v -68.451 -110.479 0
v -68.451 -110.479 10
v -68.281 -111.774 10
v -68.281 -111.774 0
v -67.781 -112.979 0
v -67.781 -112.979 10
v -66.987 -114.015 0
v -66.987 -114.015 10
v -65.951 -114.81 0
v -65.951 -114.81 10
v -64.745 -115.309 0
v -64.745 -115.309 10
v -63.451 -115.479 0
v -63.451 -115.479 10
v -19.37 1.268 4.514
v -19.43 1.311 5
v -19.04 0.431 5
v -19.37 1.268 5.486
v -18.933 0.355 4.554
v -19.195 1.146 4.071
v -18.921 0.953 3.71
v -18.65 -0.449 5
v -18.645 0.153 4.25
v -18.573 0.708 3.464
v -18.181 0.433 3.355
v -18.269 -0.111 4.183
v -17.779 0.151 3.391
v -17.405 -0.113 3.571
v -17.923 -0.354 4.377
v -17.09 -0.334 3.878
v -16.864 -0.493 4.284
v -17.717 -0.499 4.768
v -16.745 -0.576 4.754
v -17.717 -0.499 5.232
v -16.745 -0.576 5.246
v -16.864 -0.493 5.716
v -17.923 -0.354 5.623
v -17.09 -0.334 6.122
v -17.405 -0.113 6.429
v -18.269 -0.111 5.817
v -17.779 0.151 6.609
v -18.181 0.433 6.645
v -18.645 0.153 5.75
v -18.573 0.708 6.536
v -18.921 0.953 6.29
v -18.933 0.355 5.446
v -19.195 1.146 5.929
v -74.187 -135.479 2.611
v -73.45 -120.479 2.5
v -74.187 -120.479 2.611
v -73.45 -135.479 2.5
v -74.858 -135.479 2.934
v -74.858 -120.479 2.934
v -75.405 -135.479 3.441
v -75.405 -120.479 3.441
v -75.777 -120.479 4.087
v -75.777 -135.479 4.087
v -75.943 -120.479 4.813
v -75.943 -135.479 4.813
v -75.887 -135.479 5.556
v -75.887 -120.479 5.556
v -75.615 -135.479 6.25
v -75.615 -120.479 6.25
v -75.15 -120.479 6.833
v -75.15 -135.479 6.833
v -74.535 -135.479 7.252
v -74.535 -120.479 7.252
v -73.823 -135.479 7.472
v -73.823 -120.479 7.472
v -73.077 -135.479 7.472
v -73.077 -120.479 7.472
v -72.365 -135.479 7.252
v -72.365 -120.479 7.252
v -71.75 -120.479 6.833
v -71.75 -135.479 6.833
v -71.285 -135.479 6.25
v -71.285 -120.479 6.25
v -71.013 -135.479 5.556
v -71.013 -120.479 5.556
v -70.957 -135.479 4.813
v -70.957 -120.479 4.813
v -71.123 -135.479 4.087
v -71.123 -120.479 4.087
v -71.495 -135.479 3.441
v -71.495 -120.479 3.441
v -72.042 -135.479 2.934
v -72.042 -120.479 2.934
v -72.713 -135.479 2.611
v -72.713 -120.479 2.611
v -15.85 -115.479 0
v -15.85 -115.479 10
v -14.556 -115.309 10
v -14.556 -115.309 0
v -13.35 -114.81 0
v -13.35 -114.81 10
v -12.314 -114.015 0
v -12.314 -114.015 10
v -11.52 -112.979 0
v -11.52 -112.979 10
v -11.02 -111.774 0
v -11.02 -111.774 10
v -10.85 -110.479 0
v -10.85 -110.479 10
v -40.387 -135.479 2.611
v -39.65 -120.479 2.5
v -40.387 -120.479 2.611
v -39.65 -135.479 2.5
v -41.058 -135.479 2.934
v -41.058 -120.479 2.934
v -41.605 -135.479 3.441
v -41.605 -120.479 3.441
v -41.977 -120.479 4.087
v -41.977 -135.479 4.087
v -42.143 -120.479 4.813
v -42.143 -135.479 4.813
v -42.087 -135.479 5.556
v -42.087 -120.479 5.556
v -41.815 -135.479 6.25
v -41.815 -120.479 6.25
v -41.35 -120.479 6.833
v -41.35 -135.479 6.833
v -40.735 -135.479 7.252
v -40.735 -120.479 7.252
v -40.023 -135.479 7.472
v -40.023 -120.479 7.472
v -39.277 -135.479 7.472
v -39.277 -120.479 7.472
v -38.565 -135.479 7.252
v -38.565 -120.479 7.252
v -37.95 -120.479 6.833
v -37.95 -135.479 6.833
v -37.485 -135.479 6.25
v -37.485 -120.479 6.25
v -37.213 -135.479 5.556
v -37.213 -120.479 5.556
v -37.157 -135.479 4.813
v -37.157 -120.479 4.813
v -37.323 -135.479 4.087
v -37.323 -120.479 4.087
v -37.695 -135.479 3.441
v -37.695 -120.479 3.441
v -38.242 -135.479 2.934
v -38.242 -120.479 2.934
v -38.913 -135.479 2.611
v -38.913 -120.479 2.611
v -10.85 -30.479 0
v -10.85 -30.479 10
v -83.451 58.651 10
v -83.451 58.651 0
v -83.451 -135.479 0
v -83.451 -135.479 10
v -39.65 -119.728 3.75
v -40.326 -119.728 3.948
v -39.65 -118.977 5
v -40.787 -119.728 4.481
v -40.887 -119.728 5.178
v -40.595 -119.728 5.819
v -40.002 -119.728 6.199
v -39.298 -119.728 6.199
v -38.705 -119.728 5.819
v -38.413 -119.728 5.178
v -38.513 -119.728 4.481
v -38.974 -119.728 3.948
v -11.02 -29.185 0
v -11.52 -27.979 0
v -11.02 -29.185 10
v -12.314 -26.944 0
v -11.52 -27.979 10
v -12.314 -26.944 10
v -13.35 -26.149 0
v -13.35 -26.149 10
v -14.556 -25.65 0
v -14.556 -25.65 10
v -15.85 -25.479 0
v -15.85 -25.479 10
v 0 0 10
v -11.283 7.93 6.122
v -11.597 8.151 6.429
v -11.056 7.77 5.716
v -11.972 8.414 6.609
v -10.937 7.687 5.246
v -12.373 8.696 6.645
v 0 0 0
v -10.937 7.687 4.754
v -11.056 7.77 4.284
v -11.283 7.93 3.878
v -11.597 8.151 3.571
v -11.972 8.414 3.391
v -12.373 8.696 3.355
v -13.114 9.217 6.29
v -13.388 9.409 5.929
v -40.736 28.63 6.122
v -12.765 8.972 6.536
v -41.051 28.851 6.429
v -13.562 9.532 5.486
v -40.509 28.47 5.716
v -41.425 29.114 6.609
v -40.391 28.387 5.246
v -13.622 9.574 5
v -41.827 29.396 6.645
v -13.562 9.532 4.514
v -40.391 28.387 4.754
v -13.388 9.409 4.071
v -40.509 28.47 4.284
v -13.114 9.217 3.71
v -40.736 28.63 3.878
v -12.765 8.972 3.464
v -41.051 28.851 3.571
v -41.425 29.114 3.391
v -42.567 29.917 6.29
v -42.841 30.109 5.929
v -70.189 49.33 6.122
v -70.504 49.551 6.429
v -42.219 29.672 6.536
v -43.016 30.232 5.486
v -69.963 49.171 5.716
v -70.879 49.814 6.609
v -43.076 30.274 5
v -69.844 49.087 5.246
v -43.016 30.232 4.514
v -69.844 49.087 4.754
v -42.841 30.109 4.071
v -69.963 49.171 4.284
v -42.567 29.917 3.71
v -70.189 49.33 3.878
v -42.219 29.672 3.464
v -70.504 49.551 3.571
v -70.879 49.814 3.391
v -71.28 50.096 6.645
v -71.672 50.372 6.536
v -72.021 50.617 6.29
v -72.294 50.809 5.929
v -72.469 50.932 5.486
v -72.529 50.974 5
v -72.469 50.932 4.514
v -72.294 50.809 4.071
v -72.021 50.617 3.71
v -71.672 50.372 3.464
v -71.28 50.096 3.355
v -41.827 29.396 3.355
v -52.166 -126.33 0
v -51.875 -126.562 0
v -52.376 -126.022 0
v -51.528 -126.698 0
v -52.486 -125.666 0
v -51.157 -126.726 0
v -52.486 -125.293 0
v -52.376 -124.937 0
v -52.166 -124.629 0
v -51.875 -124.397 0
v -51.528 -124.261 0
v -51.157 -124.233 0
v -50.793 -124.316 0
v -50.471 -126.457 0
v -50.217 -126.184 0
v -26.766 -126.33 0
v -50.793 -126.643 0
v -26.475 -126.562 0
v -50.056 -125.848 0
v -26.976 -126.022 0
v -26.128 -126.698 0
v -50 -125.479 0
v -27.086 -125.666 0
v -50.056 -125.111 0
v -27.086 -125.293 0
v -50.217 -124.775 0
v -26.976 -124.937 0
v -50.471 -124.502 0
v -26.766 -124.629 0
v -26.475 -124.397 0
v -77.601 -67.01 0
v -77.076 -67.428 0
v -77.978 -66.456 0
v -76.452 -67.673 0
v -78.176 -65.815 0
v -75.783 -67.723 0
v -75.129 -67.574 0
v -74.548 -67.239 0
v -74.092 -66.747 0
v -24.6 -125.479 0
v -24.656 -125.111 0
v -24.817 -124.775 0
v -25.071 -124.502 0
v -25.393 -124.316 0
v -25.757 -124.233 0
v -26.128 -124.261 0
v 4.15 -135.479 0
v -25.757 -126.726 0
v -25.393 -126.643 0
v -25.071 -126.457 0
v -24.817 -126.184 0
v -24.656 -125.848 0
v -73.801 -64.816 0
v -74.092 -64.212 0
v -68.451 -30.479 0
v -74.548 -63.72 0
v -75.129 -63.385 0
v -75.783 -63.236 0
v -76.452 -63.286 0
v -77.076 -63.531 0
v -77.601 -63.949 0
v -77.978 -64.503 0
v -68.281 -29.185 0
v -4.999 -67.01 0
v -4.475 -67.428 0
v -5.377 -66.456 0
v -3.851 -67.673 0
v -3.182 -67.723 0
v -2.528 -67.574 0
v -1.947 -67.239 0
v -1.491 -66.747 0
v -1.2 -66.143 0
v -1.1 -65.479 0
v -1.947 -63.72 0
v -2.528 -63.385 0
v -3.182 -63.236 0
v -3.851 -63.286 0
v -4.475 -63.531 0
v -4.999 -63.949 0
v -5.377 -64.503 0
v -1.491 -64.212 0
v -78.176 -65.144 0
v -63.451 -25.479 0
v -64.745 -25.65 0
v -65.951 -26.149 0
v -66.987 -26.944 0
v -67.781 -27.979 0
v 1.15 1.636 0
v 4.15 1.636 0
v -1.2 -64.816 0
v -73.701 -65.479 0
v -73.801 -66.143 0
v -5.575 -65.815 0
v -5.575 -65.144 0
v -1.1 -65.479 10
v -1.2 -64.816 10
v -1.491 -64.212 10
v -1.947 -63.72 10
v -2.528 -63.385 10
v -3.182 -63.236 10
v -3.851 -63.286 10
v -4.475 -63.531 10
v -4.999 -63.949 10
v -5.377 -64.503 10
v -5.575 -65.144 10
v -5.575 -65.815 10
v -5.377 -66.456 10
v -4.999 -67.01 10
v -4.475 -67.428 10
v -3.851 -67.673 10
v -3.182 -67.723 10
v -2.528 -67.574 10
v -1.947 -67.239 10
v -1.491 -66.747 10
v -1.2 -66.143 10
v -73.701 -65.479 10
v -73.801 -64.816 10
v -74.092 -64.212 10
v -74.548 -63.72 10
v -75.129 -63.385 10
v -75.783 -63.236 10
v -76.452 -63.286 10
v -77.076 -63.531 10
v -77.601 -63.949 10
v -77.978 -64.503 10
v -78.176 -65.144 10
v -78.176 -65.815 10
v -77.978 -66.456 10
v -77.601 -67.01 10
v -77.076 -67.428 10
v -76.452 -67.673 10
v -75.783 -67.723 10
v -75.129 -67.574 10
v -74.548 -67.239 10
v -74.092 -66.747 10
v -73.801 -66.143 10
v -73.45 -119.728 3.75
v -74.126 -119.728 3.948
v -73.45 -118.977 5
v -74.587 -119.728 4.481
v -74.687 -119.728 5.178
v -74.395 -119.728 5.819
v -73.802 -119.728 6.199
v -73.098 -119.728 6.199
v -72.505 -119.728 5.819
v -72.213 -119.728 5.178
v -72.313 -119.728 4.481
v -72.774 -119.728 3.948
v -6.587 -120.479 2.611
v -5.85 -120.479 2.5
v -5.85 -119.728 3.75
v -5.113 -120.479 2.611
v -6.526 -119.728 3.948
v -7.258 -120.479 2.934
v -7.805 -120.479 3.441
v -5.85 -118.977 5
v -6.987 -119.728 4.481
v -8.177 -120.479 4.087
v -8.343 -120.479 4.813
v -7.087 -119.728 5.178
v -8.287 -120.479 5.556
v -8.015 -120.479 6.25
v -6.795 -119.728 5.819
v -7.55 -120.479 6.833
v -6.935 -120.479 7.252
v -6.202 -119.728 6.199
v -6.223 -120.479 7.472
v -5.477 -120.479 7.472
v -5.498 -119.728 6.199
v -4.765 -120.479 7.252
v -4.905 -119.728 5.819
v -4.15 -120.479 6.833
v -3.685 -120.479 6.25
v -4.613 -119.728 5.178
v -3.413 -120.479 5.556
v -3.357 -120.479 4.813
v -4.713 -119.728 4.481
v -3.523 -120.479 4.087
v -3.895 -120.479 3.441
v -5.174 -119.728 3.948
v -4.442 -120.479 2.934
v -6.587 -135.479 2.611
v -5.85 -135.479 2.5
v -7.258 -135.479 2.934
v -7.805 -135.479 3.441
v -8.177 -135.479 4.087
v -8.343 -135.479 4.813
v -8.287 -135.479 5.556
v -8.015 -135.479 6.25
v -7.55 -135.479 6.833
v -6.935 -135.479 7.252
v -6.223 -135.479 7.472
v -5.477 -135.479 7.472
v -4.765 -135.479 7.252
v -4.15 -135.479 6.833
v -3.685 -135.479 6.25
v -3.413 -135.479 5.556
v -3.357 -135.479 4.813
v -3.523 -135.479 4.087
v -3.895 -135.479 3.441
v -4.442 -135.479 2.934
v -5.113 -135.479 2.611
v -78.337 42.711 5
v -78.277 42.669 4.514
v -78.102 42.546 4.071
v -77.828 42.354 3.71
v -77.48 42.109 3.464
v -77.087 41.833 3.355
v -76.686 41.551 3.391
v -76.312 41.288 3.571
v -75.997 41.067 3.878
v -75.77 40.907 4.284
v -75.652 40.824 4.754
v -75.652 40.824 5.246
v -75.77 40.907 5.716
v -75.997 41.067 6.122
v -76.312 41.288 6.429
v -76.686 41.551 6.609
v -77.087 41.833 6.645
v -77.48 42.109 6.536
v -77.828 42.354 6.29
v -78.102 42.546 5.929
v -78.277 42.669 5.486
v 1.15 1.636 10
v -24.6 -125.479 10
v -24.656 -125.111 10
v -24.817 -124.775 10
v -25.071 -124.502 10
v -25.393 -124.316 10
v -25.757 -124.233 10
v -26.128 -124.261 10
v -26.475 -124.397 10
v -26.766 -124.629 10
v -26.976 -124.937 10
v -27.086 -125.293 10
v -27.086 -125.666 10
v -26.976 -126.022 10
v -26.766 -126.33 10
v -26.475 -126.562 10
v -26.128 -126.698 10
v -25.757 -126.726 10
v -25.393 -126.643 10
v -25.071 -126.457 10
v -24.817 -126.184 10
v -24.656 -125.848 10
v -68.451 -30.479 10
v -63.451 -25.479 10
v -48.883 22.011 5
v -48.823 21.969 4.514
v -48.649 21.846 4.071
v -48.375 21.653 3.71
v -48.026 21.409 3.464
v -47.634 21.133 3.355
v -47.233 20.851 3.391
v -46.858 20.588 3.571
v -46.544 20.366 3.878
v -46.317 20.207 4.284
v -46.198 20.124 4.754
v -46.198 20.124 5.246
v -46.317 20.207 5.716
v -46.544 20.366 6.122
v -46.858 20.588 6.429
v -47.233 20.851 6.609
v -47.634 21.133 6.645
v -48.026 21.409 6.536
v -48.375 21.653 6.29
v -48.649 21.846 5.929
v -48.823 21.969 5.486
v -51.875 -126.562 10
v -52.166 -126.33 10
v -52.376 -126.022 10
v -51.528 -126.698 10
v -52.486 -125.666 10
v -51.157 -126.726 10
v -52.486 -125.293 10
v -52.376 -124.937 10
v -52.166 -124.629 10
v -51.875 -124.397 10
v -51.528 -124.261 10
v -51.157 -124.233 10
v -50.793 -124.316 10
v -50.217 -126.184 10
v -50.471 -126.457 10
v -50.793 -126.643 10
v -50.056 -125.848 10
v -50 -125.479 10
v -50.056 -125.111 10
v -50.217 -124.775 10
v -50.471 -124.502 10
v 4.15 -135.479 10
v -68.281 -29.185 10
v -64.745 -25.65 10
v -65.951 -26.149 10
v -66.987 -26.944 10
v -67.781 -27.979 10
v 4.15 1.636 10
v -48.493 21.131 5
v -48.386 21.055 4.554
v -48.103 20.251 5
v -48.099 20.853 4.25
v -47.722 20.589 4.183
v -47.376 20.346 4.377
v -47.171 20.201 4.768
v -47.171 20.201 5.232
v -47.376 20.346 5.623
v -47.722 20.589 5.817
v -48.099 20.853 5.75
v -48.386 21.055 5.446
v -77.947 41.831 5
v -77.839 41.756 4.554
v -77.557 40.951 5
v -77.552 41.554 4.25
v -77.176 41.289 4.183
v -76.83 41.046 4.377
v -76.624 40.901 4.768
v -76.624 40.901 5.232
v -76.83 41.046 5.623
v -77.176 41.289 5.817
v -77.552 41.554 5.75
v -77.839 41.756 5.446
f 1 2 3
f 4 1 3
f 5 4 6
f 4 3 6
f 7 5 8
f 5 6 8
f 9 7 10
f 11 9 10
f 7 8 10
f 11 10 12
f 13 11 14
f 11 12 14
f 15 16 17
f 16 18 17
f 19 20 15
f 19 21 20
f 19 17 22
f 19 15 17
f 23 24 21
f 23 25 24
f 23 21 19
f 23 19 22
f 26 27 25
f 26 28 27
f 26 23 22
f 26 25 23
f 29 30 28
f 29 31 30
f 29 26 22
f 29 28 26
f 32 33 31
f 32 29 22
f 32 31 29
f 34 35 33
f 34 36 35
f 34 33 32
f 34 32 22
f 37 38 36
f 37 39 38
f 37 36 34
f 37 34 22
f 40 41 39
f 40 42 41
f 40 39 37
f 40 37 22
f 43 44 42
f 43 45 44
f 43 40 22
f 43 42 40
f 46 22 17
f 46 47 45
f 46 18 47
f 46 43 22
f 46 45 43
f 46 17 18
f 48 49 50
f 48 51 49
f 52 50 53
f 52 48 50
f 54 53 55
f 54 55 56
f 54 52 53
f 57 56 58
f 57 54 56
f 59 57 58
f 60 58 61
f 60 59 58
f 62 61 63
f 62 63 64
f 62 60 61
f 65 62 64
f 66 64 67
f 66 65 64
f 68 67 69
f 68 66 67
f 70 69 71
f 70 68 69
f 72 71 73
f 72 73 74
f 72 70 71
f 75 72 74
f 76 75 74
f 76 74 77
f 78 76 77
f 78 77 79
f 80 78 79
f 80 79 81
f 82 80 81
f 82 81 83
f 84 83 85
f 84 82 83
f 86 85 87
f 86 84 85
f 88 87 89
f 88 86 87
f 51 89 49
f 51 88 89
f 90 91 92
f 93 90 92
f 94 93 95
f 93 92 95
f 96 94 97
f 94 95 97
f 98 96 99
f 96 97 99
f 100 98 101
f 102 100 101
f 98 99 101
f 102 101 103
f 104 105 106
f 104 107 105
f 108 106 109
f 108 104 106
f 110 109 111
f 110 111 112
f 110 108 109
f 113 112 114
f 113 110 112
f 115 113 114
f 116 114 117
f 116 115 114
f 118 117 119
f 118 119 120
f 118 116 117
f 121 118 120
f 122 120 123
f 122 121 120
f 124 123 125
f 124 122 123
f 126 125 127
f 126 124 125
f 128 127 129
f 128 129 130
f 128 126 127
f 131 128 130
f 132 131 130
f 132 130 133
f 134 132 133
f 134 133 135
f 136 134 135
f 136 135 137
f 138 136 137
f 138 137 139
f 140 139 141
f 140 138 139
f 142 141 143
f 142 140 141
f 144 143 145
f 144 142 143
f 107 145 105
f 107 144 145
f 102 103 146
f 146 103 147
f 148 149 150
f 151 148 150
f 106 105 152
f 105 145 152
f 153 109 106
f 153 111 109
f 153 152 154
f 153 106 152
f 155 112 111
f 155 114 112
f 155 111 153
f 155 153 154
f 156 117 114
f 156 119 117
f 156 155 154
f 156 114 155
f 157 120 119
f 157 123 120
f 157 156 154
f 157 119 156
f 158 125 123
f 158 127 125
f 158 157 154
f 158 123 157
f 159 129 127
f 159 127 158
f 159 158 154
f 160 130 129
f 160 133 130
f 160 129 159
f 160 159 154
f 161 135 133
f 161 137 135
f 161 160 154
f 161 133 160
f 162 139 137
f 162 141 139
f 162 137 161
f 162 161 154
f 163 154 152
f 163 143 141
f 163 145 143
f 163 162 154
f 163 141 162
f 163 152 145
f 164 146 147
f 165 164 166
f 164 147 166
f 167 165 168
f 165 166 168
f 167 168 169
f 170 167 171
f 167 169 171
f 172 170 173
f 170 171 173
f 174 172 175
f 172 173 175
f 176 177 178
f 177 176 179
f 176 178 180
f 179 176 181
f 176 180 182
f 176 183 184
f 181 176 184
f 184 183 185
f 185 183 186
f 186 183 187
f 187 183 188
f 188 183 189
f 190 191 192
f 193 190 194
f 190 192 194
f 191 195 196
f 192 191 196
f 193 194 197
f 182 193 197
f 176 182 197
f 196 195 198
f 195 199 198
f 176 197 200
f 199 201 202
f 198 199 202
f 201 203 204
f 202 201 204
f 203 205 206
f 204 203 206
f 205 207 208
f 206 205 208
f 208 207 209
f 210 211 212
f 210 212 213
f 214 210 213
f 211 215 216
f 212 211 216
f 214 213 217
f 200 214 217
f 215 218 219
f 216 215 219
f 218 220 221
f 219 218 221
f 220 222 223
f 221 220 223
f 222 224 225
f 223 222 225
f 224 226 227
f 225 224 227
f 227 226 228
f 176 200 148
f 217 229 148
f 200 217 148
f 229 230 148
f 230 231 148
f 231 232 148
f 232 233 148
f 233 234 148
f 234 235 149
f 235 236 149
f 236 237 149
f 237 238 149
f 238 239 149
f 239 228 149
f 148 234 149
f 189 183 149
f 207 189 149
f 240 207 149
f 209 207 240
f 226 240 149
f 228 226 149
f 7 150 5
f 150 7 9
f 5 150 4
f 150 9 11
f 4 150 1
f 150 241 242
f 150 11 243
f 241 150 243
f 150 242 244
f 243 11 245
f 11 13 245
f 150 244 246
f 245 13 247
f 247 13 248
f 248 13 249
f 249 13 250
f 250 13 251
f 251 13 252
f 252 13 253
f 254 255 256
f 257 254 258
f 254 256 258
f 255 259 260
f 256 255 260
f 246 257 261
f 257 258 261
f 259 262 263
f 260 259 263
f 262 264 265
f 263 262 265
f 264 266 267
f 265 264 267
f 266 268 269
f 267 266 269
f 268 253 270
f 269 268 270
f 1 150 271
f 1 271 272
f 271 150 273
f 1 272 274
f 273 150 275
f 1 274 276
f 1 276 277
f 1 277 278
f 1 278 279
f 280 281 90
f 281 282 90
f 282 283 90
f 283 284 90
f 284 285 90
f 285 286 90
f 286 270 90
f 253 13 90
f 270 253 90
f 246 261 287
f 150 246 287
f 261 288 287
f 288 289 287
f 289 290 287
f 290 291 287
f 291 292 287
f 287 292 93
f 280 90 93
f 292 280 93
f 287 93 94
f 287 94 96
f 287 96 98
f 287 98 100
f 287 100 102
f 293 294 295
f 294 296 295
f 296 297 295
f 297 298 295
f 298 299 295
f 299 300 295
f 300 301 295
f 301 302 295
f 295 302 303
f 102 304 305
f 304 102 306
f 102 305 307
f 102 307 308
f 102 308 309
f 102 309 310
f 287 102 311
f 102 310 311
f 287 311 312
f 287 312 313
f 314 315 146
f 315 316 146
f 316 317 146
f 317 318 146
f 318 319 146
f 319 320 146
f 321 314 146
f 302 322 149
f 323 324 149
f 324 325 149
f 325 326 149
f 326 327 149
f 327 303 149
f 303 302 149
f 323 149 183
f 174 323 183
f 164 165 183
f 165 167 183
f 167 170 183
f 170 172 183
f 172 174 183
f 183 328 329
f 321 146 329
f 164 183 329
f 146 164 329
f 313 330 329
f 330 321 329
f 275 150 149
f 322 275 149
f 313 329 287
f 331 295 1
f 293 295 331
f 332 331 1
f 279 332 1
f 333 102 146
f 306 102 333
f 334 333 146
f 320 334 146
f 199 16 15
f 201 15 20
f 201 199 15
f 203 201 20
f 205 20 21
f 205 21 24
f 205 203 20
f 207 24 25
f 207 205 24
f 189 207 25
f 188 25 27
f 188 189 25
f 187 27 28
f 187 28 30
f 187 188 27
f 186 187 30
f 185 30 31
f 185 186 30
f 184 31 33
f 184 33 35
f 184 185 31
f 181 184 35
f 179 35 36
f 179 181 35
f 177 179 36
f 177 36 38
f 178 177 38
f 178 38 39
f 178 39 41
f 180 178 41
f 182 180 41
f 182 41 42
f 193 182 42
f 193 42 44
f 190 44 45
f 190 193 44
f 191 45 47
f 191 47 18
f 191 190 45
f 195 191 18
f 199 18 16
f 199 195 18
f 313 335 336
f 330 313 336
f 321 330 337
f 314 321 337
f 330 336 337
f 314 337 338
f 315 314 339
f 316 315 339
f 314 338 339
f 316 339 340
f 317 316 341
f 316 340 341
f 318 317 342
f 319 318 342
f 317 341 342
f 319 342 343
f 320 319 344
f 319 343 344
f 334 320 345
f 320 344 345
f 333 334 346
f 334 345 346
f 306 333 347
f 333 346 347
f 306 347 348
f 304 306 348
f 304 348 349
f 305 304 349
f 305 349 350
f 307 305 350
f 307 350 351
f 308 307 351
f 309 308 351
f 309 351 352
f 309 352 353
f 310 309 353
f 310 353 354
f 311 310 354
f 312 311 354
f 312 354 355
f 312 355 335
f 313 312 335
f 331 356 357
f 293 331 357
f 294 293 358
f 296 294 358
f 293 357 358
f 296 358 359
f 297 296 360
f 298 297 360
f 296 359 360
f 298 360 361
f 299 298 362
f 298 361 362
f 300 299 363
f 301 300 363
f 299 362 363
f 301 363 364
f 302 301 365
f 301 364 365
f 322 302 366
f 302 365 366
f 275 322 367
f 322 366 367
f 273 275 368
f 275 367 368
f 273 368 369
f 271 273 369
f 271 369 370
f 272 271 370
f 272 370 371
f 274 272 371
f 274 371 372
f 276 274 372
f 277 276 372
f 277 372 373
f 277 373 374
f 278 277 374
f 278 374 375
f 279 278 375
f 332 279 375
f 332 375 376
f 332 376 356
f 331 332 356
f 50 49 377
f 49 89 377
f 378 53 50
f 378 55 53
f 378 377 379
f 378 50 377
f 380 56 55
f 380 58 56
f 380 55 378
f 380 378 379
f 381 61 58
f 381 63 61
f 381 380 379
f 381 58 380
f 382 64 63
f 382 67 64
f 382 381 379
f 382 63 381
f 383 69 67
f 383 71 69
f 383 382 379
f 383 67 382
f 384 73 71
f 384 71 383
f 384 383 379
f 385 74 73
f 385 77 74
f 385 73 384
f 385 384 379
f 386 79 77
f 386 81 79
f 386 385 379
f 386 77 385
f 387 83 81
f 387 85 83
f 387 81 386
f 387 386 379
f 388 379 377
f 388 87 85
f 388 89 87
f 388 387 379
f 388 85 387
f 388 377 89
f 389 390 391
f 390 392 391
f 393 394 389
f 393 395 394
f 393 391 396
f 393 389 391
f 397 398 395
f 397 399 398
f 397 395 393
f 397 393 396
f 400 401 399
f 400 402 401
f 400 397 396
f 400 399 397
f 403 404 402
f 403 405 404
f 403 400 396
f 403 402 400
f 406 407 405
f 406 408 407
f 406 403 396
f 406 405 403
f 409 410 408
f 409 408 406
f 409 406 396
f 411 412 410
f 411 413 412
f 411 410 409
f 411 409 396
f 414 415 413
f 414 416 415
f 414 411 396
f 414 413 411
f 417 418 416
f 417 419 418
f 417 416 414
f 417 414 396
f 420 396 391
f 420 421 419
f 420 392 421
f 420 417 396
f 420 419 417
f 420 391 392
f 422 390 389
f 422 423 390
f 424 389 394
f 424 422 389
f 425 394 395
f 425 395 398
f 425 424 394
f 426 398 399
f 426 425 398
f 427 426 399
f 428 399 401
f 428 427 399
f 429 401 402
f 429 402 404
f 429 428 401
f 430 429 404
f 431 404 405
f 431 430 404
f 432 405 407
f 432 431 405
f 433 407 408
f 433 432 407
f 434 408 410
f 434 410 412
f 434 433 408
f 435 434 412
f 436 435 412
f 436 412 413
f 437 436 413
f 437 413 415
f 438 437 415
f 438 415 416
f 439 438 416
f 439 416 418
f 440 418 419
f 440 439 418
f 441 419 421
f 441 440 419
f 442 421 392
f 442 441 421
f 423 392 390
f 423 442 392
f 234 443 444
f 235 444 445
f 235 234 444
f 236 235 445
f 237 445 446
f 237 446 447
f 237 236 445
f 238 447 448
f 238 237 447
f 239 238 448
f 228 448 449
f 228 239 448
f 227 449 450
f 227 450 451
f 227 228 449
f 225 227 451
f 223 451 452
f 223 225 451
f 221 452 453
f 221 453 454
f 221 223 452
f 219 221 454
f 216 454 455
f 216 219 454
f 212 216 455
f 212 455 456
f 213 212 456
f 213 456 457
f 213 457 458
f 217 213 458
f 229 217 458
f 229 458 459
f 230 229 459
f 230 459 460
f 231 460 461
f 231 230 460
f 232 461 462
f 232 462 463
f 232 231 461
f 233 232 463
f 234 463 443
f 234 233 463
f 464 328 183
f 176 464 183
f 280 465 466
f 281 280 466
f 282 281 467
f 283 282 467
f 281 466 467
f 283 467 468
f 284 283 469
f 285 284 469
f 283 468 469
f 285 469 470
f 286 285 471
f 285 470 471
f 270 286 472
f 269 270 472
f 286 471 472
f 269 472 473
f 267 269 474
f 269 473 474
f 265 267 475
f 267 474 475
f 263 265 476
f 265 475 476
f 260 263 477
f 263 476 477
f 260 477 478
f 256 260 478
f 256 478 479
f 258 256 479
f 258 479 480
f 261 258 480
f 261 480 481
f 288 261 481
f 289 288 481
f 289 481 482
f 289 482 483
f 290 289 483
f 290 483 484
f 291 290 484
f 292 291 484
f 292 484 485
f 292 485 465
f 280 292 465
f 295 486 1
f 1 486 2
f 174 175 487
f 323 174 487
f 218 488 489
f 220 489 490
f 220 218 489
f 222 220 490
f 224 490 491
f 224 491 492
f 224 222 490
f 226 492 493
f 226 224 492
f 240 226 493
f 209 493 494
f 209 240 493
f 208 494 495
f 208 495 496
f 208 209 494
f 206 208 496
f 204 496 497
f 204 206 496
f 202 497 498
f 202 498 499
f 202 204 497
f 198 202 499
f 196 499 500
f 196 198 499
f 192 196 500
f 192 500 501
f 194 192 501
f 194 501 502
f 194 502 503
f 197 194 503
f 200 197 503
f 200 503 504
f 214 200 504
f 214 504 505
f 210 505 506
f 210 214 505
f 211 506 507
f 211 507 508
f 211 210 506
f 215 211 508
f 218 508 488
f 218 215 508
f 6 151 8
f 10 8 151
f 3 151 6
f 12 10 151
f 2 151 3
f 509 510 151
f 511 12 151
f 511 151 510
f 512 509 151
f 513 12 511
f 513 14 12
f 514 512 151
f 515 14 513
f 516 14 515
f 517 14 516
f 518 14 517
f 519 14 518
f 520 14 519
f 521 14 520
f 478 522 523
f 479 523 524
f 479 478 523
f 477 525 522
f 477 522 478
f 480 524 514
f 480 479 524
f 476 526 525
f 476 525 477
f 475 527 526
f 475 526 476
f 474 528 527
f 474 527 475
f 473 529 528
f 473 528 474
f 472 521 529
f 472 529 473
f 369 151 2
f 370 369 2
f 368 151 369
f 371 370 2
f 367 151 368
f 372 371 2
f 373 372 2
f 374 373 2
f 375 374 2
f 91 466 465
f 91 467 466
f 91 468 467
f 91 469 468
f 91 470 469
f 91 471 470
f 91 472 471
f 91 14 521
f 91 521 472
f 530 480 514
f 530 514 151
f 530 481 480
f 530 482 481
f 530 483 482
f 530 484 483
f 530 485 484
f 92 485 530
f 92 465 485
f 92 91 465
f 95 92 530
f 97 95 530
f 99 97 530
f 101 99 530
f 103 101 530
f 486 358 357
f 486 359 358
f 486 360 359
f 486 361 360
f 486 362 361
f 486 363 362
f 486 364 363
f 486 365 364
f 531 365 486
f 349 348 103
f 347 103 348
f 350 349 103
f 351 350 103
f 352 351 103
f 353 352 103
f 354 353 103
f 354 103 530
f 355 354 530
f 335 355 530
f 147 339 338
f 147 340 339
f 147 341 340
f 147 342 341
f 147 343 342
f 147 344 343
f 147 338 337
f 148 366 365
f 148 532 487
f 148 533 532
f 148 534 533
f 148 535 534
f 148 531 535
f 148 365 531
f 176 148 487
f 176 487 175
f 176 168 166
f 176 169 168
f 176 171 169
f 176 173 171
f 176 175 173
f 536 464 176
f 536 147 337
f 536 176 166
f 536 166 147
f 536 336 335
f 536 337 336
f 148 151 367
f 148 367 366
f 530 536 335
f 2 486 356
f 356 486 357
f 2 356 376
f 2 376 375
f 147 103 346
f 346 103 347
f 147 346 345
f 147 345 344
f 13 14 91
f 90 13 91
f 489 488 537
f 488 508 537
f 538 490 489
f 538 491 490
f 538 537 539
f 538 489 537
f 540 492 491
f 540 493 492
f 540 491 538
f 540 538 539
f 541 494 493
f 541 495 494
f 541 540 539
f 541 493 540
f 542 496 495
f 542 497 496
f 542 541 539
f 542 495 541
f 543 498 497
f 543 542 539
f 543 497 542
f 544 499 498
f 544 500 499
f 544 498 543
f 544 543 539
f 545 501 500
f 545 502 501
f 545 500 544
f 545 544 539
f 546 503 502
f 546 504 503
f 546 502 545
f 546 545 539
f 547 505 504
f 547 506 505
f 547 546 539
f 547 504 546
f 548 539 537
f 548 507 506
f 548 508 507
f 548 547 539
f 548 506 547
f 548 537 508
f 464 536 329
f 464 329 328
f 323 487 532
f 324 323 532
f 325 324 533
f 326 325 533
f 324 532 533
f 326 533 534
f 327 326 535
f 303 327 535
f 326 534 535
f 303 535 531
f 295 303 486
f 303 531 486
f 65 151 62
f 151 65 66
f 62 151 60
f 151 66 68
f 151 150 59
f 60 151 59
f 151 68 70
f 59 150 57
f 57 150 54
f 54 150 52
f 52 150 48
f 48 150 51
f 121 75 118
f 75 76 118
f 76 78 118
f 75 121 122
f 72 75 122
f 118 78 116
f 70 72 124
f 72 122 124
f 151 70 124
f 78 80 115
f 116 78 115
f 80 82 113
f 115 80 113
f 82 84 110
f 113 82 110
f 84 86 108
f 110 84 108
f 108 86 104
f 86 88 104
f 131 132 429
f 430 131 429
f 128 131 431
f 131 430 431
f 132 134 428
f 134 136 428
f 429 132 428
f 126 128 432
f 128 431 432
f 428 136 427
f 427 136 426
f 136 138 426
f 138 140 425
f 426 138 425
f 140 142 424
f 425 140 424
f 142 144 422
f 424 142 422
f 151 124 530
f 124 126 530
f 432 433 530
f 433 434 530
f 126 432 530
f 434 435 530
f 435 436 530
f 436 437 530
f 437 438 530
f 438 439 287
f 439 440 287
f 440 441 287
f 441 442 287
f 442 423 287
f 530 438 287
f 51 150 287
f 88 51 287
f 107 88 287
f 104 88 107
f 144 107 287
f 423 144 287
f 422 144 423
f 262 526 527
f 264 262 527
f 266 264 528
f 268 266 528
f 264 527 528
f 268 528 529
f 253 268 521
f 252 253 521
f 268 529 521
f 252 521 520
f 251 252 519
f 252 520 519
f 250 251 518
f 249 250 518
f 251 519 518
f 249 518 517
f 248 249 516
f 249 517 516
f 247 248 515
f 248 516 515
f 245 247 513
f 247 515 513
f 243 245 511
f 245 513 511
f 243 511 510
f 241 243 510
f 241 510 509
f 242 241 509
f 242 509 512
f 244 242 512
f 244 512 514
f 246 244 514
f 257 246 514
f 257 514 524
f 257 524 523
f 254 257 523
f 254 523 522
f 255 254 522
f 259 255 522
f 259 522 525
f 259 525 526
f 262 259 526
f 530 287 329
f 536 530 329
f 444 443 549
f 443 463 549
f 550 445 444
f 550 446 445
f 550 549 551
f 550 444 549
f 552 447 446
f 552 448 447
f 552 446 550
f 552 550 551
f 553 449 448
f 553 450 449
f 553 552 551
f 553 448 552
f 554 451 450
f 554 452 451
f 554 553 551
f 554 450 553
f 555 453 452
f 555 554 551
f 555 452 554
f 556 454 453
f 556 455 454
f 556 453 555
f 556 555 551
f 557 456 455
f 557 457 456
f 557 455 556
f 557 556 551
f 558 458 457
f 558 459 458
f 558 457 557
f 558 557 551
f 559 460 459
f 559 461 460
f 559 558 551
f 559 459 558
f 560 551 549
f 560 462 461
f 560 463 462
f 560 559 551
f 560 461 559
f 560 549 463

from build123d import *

# Parameters (mm, degrees)
EXTRUDE_1_DEPTH        = 10
PATTERN_LINEAR_1_COUNT = 3
PATTERN_LINEAR_1_PITCH = 36
CUT_EXTRUDE_1_DEPTH    = 160.432744146
PATTERN_LINEAR_2_COUNT = 3
PATTERN_LINEAR_2_PITCH = 33.8
SKETCH_7_R             = 2.25
CUT_EXTRUDE_2_DEPTH    = 160.432744146
HOLE_WIZARD_M3_1_D     = 2.5
PATTERN_LINEAR_3_COUNT = 2
PATTERN_LINEAR_3_PITCH = 25.4


with BuildPart() as part:
    # 草图1 → 凸台-拉伸1 (new body)
    with BuildSketch(Plane.XY):
        Polygon((0, 0), (-83.451271177, 58.650535708), (-83.451271177, -135.479464292), (4.150010504, -135.479464292), (4.150010504, 1.636299435), (1.150010504, 1.636299435), align=None)
    extrude(amount=EXTRUDE_1_DEPTH)

    # 草图2 → M4 螺纹孔1 (revolve, cut)
    with BuildSketch(Plane(origin=(-12.272245761, 8.625078781, 5), x_dir=(-0.8181497174250271, 0.5750052520432736, 0), z_dir=(0, 0, 1))):
        Polygon((0, 0), (0, 11.091420021), (1.65, 10.1), (1.65, 0), align=None)
    hole_wizard_m4_1 = revolve(axis=Axis((-8.620962411, 13.820329486, 5), (-0.5750052520432737, -0.818149717425027, 0)), mode=Mode.SUBTRACT)

    # 阵列(线性)1: M4 螺纹孔1 ×3
    with Locations(*[Vector(-0.8181497174250268, 0.5750052520432738, 0) * (i * PATTERN_LINEAR_1_PITCH) for i in range(1, PATTERN_LINEAR_1_COUNT)]):
        add(hole_wizard_m4_1, mode=Mode.SUBTRACT)

    # 草图4 → 切除-拉伸1 (cut, through all)
    with BuildSketch(Plane.XY.offset(10)):
        with BuildLine():
            Line((-63.451271177, -115.479464292), (-15.849989496, -115.479464292))
            ThreePointArc((-15.849989496, -115.479464292), (-12.31445559, -114.014998198), (-10.849989496, -110.479464292))
            Line((-10.849989496, -110.479464292), (-10.849989496, -30.479464292))
            ThreePointArc((-10.849989496, -30.479464292), (-12.31445559, -26.943930386), (-15.849989496, -25.479464292))
            Line((-15.849989496, -25.479464292), (-63.451271177, -25.479464292))
            ThreePointArc((-63.451271177, -25.479464292), (-66.986805083, -26.943930386), (-68.451271177, -30.479464292))
            Line((-68.451271177, -30.479464292), (-68.451271177, -110.479464292))
            ThreePointArc((-68.451271177, -110.479464292), (-66.986805083, -114.014998198), (-63.451271177, -115.479464292))
        make_face()
    extrude(amount=-CUT_EXTRUDE_1_DEPTH, mode=Mode.SUBTRACT)

    # 草图5 → M6 螺纹孔1 (revolve, cut)
    with BuildSketch(Plane(origin=(-5.849989496, -135.479464292, 5), x_dir=(0, 0, -1), z_dir=(1, 0, 0))):
        Polygon((0, 0), (0, 16.502151548), (2.5, 15), (2.5, 0), align=None)
    hole_wizard_m6_1 = revolve(axis=Axis((-5.849989496, -141.829464292, 5), (0, 1, 0)), mode=Mode.SUBTRACT)

    # 阵列(线性)2: M6 螺纹孔1 ×3
    with Locations(*[(-i * PATTERN_LINEAR_2_PITCH, 0, 0) for i in range(1, PATTERN_LINEAR_2_COUNT)]):
        add(hole_wizard_m6_1, mode=Mode.SUBTRACT)

    # 草图7 → 切除-拉伸2 (cut, through all)
    with BuildSketch(Plane.XY.offset(10)):
        with Locations((-75.951271177, -65.479464292)):
            Circle(SKETCH_7_R)
        with Locations((-3.349989496, -65.479464292)):
            Circle(SKETCH_7_R)
    extrude(amount=-CUT_EXTRUDE_2_DEPTH, mode=Mode.SUBTRACT)

    # M3 螺纹孔1 (through all)
    with Locations(Plane(origin=(0, 0, 0), x_dir=(-1, 0, 0), z_dir=(0, 0, -1))):
        with Locations((25.849989496, -125.479464292)):
            hole_wizard_m3_1 = Hole(HOLE_WIZARD_M3_1_D / 2)

    # 阵列(线性)3: M3 螺纹孔1 ×2
    with Locations(*[(-i * PATTERN_LINEAR_3_PITCH, 0, 0) for i in range(1, PATTERN_LINEAR_3_COUNT)]):
        add(hole_wizard_m3_1, mode=Mode.SUBTRACT)


solid = part.part
